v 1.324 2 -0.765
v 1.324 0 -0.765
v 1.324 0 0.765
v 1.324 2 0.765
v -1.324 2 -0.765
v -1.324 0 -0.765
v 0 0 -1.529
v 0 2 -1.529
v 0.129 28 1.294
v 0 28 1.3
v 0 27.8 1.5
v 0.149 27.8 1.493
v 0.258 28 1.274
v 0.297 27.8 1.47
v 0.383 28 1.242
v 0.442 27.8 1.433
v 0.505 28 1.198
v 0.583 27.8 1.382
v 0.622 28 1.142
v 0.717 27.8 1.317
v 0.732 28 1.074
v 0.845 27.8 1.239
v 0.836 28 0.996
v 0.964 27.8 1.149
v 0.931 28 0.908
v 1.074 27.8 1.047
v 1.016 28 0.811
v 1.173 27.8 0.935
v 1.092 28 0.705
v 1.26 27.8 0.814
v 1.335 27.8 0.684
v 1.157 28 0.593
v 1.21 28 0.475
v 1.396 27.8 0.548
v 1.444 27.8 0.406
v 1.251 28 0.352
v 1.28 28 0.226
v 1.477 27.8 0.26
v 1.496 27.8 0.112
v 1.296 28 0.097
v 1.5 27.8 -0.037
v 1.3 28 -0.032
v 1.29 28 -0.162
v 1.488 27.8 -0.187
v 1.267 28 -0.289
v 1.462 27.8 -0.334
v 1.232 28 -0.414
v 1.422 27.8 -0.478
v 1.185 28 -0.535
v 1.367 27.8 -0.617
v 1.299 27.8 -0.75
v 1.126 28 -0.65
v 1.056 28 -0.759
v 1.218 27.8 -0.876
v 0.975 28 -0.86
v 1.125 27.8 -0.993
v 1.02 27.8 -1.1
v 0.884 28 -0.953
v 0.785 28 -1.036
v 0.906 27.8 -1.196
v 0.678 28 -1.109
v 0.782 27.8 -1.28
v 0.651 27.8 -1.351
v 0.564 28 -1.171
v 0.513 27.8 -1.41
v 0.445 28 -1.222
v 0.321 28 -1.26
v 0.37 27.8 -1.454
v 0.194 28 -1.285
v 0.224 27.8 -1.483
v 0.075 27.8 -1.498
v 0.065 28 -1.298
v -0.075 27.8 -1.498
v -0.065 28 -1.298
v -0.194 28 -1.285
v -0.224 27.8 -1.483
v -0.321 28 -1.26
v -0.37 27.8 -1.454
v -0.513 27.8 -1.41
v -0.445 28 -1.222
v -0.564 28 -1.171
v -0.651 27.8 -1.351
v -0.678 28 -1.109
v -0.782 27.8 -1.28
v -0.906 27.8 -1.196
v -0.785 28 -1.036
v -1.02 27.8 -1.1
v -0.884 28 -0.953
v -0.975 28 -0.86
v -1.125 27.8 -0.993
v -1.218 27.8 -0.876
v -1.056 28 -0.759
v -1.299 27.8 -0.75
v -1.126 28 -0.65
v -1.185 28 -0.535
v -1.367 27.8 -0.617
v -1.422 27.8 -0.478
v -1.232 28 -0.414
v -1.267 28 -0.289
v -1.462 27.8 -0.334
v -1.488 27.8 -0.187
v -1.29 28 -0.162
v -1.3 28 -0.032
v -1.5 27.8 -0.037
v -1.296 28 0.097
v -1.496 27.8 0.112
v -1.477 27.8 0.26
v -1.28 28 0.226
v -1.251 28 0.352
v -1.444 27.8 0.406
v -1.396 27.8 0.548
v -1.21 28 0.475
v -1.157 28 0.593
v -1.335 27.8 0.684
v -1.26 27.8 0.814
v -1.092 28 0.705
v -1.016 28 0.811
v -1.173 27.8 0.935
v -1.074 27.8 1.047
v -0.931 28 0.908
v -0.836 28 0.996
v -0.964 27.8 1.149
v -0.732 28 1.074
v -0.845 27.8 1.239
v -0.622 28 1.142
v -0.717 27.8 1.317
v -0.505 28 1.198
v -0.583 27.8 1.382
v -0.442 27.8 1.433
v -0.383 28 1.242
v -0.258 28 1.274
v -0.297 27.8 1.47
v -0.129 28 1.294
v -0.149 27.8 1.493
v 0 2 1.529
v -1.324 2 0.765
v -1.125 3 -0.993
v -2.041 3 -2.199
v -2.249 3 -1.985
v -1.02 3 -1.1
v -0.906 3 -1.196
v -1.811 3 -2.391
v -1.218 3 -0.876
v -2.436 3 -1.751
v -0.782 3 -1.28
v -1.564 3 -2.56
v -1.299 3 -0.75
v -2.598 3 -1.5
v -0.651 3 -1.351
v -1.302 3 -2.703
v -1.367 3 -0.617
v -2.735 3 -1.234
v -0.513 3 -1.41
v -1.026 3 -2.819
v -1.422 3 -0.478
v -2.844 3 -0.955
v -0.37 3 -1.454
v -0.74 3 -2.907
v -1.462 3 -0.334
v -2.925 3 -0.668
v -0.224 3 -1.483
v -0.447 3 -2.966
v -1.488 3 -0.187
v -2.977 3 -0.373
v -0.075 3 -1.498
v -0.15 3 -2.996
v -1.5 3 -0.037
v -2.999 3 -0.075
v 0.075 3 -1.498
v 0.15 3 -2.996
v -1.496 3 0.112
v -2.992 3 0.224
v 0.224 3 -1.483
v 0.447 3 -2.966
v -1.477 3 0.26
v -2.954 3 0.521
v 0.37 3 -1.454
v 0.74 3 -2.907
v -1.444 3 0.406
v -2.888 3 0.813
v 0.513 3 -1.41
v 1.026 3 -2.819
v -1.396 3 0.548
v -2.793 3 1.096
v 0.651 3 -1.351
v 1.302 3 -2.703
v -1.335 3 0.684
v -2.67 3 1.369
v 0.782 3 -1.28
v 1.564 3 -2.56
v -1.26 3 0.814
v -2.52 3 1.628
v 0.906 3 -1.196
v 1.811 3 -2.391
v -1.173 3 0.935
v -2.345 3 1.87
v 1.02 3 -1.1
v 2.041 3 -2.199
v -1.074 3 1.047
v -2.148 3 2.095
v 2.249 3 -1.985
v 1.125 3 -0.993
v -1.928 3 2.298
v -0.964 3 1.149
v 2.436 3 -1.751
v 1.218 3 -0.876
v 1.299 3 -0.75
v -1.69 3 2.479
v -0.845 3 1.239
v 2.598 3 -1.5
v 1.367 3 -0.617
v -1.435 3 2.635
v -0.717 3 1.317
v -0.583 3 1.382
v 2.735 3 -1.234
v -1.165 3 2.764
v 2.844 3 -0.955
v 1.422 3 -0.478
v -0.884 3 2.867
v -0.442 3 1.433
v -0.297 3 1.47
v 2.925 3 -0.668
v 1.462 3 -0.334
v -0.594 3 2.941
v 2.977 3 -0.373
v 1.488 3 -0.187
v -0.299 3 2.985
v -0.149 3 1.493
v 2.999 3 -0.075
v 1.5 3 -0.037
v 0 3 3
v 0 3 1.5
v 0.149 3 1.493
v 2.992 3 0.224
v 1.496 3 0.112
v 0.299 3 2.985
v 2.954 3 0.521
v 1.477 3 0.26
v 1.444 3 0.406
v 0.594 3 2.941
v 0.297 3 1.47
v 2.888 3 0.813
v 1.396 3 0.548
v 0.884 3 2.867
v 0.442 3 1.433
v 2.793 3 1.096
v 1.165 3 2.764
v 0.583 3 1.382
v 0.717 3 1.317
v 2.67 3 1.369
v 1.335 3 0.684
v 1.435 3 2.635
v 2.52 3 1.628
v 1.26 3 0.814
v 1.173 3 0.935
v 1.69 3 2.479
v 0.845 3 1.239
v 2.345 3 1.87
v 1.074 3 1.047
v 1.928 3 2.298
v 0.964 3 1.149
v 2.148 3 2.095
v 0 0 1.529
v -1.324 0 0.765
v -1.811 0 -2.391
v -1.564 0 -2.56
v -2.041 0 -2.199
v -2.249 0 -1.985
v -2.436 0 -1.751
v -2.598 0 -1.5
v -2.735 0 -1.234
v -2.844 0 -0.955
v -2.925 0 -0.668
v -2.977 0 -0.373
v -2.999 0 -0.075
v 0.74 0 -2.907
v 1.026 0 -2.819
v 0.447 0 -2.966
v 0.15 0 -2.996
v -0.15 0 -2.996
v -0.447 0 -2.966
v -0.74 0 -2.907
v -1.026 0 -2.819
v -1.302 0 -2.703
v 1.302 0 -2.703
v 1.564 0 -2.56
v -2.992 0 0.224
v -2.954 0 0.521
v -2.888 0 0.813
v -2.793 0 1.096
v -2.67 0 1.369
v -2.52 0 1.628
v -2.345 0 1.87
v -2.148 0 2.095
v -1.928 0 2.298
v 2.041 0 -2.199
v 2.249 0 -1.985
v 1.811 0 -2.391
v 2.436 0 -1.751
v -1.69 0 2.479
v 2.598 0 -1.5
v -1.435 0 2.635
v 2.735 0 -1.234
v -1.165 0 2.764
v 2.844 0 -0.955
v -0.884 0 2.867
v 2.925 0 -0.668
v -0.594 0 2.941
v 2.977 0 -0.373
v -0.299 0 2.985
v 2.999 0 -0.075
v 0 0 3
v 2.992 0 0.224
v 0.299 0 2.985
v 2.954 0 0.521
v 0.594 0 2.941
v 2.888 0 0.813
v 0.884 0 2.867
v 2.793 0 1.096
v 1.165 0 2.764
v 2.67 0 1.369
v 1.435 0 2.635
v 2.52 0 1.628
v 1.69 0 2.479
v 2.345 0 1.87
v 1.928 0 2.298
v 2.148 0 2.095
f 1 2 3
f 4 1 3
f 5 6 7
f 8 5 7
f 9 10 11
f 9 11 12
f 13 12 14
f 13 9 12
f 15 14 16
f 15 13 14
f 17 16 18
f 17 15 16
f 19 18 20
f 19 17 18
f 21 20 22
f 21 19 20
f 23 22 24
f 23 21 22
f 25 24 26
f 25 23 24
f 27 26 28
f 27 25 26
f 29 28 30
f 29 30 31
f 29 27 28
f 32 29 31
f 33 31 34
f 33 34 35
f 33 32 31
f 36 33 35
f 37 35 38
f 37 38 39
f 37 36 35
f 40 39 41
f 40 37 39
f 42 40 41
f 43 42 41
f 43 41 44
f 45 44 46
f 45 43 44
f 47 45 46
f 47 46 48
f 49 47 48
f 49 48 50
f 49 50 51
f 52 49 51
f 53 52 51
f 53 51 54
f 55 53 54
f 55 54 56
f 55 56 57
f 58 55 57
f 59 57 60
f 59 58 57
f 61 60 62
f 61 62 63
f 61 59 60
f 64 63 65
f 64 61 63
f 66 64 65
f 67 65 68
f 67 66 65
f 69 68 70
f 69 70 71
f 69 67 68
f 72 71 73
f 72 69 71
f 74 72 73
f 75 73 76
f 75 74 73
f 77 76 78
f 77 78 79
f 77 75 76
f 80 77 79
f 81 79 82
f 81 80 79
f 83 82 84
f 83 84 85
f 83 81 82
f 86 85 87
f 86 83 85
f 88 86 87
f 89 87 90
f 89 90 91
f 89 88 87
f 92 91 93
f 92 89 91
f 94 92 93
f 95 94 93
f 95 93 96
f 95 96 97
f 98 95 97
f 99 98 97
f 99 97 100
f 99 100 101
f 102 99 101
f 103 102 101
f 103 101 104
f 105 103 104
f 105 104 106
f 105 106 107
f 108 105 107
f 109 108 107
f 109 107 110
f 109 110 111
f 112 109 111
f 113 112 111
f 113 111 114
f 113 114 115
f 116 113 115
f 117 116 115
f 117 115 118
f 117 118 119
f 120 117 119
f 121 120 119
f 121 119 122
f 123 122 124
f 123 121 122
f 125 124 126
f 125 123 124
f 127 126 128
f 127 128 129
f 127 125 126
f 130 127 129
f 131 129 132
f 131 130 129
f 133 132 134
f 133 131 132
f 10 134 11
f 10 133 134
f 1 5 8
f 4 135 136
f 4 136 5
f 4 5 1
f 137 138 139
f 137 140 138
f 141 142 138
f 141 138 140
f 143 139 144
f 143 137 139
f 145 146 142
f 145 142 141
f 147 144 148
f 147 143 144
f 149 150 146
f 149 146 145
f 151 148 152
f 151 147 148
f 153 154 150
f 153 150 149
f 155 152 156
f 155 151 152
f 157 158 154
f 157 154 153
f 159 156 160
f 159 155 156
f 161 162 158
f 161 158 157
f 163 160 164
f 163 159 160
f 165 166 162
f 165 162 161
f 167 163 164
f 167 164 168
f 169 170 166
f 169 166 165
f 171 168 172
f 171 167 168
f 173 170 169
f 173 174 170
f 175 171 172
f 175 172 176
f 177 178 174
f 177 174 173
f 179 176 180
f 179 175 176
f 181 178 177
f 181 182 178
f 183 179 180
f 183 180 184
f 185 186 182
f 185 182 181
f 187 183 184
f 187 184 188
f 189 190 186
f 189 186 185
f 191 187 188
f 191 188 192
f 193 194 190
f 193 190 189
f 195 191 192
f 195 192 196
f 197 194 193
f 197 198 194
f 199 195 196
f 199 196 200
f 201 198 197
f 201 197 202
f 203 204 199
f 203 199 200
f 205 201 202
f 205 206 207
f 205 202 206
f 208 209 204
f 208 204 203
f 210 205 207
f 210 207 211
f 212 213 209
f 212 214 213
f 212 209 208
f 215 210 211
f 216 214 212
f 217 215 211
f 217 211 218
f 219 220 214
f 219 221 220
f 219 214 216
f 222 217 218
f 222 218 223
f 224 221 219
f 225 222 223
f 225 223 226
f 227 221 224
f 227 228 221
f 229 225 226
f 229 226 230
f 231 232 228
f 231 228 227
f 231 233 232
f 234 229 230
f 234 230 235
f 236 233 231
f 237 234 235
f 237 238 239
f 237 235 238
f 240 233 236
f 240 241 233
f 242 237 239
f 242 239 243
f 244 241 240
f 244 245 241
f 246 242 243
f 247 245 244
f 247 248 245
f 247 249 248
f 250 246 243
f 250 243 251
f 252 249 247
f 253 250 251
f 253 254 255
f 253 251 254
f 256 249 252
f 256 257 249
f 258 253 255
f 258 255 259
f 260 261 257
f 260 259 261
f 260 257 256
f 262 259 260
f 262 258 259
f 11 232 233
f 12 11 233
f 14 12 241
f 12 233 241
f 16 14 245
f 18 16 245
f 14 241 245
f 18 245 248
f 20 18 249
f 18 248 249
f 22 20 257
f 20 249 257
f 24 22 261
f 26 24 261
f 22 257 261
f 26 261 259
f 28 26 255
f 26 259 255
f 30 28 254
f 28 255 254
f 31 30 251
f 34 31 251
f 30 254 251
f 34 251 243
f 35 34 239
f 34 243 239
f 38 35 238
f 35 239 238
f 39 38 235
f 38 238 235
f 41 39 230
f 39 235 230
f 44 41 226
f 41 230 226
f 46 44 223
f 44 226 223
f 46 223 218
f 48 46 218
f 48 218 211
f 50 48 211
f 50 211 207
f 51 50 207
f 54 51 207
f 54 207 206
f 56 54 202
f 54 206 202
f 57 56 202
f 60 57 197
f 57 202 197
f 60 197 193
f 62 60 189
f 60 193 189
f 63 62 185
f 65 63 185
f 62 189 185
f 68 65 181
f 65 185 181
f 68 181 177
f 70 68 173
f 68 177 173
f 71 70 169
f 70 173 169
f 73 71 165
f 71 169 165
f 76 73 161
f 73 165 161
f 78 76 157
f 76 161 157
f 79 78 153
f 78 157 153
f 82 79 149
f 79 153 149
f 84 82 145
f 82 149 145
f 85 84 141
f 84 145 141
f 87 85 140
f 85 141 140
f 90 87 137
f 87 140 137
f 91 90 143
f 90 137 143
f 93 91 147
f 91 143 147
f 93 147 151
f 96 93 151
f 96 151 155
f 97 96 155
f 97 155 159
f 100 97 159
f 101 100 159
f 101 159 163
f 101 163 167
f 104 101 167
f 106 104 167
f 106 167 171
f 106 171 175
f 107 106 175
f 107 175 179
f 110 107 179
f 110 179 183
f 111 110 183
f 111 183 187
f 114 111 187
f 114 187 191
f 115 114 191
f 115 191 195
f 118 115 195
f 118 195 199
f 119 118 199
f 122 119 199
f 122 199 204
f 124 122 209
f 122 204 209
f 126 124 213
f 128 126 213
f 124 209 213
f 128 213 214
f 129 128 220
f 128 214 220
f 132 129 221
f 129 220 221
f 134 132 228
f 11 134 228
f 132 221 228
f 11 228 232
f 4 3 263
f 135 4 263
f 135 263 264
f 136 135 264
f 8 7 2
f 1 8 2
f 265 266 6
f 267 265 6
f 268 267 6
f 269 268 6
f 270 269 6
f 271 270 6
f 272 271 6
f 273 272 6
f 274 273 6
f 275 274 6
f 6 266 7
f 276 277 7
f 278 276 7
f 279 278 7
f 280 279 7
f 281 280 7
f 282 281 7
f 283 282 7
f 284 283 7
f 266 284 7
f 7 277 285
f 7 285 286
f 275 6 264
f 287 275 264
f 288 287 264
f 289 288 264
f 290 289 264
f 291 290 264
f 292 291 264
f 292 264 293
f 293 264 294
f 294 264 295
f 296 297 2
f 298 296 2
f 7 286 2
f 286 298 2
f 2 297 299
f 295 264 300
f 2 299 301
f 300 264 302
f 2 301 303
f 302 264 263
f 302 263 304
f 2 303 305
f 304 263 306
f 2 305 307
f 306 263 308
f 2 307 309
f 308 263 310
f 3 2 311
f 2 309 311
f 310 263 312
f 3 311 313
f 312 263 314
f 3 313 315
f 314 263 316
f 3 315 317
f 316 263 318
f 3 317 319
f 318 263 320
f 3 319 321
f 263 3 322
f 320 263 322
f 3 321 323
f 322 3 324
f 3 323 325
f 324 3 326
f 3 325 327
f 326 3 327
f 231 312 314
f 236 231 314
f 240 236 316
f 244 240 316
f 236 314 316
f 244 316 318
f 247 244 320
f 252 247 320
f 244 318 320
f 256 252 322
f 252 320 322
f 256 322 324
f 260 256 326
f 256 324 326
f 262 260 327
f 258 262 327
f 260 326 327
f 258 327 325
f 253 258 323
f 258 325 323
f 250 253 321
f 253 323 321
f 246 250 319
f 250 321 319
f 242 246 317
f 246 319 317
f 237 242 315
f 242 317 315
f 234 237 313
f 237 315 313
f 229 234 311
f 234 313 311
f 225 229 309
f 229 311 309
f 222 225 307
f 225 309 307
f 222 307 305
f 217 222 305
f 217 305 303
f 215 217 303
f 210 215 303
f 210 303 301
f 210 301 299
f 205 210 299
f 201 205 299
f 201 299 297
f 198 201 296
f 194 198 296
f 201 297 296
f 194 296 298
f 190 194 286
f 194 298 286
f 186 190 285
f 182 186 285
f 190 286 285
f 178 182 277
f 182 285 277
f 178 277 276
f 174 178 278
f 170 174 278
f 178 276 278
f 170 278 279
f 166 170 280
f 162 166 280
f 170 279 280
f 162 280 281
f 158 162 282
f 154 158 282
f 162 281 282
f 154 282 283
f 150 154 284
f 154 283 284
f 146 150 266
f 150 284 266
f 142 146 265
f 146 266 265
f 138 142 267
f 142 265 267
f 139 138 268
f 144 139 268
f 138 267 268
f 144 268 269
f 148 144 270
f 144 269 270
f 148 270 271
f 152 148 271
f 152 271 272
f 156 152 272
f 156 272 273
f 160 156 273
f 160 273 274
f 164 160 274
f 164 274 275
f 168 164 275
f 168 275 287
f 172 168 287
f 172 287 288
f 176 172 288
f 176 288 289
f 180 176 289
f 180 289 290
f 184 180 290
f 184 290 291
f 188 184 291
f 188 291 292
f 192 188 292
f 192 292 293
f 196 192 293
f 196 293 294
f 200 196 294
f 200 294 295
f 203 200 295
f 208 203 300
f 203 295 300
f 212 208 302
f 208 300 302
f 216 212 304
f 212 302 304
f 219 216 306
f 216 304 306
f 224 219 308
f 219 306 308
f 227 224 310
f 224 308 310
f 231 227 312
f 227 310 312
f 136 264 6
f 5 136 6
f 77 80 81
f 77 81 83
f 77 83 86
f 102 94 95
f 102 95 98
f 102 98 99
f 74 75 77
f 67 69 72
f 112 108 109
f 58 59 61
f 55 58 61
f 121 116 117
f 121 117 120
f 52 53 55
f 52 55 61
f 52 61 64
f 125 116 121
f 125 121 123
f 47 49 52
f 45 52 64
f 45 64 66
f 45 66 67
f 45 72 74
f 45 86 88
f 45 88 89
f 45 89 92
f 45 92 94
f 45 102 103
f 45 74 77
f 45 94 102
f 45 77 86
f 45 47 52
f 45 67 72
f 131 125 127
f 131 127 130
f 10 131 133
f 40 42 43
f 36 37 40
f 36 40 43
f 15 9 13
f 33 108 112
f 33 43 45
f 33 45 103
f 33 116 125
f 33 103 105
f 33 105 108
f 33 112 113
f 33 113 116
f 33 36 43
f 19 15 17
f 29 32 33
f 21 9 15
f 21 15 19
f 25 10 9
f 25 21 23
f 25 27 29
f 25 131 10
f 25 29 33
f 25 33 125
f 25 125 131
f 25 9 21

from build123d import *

# Parameters (mm, degrees)
SKETCH1_R           = 3
BOSS_EXTRUDE1_DEPTH = 3
SKETCH2_R           = 1.5
BOSS_EXTRUDE2_DEPTH = 25
CHAMFER1_SIZE       = 0.2
CUT_EXTRUDE1_DEPTH  = 2


with BuildPart() as part:
    # Sketch1 → Boss-Extrude1 (new body)
    with BuildSketch(Plane(origin=(0, 0, 0), x_dir=(1, 0, 0), z_dir=(0, 1, 0))):
        with Locations(Location((0, 0, 0), (0, 0, 270))):
            Circle(SKETCH1_R)
    extrude(amount=BOSS_EXTRUDE1_DEPTH)

    # Sketch2 → Boss-Extrude2 (add)
    with BuildSketch(Plane(origin=(0, 3, 0), x_dir=(1, 0, 0), z_dir=(0, 1, 0))):
        with Locations(Location((0, 0, 0), (0, 0, 270))):
            Circle(SKETCH2_R)
    extrude(amount=BOSS_EXTRUDE2_DEPTH)

    # Chamfer1
    chamfer1_edges = [part.edges().sort_by_distance(p)[0] for p in [
        (0, 28, -1.5),
    ]]
    chamfer(chamfer1_edges, length=CHAMFER1_SIZE)

    # Sketch3 → Cut-Extrude1 (cut)
    with BuildSketch(Plane.XZ):
        Polygon((0, 1.529103694), (-1.324242644, 0.764551847), (-1.324242644, -0.764551847), (0, -1.529103694), (1.324242644, -0.764551847), (1.324242644, 0.764551847), align=None)
    extrude(amount=-CUT_EXTRUDE1_DEPTH, mode=Mode.SUBTRACT)


solid = part.part
